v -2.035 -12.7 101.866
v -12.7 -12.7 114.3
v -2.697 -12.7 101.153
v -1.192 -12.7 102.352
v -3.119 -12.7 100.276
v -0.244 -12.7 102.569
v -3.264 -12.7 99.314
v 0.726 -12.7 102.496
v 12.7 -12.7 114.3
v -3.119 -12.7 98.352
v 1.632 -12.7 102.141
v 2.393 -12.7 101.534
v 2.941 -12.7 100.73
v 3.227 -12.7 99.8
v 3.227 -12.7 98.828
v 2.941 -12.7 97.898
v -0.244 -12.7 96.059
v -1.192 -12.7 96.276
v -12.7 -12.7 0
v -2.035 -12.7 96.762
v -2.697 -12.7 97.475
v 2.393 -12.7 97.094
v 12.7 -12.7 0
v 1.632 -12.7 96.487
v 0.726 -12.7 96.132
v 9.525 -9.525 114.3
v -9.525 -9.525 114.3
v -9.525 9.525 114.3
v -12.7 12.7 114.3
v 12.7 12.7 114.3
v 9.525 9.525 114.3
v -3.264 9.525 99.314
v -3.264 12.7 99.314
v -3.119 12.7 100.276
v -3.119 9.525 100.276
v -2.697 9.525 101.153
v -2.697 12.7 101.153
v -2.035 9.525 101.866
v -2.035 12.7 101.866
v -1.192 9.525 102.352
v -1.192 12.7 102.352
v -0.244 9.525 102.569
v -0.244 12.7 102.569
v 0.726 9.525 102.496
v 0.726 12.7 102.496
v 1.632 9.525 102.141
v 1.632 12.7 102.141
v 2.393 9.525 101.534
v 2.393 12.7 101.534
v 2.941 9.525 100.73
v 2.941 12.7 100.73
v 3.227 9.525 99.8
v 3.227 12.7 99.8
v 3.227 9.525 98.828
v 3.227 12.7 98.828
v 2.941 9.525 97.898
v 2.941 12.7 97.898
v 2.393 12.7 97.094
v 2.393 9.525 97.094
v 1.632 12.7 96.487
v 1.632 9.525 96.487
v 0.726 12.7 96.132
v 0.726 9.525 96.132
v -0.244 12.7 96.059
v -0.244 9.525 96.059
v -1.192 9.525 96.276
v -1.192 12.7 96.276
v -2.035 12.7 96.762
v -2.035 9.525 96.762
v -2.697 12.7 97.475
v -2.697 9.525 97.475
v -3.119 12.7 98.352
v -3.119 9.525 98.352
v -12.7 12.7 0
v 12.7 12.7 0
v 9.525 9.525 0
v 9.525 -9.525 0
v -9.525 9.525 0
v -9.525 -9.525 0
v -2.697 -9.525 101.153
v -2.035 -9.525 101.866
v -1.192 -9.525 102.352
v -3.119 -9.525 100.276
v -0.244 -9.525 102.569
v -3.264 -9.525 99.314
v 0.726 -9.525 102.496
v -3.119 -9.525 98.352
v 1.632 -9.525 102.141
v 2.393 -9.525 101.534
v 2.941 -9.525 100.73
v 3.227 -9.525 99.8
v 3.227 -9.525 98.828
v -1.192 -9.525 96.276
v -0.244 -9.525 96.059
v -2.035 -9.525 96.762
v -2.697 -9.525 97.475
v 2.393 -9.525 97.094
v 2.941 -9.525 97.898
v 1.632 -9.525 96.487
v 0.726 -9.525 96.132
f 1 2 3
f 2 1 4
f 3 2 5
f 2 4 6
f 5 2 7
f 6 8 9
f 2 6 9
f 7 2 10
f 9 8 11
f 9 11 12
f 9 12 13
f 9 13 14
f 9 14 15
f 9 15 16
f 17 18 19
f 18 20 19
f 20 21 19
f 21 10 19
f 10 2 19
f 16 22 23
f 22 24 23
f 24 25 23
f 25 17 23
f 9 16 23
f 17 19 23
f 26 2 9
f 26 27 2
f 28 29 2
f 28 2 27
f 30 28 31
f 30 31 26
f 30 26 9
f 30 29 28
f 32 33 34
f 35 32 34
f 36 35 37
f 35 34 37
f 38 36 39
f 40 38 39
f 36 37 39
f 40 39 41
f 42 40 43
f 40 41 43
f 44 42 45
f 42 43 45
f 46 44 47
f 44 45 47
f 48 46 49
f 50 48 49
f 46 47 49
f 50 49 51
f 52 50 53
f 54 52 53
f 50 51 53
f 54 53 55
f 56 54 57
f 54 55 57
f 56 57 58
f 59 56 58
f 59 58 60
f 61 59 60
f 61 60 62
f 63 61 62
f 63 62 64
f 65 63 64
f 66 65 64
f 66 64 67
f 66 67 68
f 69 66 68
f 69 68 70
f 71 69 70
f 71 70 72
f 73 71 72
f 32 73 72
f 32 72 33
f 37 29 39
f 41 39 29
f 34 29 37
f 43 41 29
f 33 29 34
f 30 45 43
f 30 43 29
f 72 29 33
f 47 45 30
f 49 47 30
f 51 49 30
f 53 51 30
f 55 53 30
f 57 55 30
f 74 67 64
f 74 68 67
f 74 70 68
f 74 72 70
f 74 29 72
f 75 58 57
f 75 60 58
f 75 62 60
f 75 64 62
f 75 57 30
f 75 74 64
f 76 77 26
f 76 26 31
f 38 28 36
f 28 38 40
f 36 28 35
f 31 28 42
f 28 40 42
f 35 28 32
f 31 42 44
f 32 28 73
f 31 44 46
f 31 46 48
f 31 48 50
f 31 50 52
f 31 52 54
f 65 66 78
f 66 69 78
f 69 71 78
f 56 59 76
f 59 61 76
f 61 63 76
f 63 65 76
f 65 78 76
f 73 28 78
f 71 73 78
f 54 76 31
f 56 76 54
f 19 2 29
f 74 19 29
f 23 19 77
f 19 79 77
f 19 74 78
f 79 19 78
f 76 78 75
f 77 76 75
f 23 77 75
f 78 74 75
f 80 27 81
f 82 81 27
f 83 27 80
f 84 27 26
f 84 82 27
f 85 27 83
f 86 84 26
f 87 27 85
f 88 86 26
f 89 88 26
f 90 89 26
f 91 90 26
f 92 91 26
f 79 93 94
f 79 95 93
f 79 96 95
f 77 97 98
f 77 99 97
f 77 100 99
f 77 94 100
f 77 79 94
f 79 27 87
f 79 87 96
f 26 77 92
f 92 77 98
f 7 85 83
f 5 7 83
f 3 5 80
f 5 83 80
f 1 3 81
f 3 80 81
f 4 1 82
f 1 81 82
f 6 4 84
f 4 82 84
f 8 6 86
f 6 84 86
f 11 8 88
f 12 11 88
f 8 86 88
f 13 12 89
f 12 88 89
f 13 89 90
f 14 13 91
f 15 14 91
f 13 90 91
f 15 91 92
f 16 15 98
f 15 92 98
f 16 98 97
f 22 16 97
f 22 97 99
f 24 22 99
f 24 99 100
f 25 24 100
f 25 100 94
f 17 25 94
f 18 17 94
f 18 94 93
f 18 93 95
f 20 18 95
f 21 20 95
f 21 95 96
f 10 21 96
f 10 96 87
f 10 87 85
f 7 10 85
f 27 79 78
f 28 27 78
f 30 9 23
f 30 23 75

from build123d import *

# Parameters (mm, degrees)
SKETCH1_W           = 25.4
SKETCH1_H           = 25.4
BOSS_EXTRUDE1_DEPTH = 114.3
SKETCH2_W           = 19.05
SKETCH2_H           = 19.05
CUT_EXTRUDE1_DEPTH  = 116.702506455
SKETCH3_R           = 3.2639
CUT_EXTRUDE2_DEPTH  = 118.774954893


with BuildPart() as part:
    # Sketch1 → Boss-Extrude1 (new body)
    with BuildSketch(Plane.XY):
        Rectangle(SKETCH1_W, SKETCH1_H)
    extrude(amount=BOSS_EXTRUDE1_DEPTH)

    # Sketch2 → Cut-Extrude1 (cut, through all)
    with BuildSketch(Plane.XY):
        Rectangle(SKETCH2_W, SKETCH2_H)
    extrude(amount=CUT_EXTRUDE1_DEPTH, mode=Mode.SUBTRACT)

    # Sketch3 → Cut-Extrude2 (cut, through all)
    with BuildSketch(Plane(origin=(0, 12.7, 0), x_dir=(1, 0, 0), z_dir=(0, 1, 0))):
        with Locations(Location((0, -99.314, 0), (0, 0, 180))):
            Circle(SKETCH3_R)
    extrude(amount=-CUT_EXTRUDE2_DEPTH, mode=Mode.SUBTRACT)


solid = part.part
